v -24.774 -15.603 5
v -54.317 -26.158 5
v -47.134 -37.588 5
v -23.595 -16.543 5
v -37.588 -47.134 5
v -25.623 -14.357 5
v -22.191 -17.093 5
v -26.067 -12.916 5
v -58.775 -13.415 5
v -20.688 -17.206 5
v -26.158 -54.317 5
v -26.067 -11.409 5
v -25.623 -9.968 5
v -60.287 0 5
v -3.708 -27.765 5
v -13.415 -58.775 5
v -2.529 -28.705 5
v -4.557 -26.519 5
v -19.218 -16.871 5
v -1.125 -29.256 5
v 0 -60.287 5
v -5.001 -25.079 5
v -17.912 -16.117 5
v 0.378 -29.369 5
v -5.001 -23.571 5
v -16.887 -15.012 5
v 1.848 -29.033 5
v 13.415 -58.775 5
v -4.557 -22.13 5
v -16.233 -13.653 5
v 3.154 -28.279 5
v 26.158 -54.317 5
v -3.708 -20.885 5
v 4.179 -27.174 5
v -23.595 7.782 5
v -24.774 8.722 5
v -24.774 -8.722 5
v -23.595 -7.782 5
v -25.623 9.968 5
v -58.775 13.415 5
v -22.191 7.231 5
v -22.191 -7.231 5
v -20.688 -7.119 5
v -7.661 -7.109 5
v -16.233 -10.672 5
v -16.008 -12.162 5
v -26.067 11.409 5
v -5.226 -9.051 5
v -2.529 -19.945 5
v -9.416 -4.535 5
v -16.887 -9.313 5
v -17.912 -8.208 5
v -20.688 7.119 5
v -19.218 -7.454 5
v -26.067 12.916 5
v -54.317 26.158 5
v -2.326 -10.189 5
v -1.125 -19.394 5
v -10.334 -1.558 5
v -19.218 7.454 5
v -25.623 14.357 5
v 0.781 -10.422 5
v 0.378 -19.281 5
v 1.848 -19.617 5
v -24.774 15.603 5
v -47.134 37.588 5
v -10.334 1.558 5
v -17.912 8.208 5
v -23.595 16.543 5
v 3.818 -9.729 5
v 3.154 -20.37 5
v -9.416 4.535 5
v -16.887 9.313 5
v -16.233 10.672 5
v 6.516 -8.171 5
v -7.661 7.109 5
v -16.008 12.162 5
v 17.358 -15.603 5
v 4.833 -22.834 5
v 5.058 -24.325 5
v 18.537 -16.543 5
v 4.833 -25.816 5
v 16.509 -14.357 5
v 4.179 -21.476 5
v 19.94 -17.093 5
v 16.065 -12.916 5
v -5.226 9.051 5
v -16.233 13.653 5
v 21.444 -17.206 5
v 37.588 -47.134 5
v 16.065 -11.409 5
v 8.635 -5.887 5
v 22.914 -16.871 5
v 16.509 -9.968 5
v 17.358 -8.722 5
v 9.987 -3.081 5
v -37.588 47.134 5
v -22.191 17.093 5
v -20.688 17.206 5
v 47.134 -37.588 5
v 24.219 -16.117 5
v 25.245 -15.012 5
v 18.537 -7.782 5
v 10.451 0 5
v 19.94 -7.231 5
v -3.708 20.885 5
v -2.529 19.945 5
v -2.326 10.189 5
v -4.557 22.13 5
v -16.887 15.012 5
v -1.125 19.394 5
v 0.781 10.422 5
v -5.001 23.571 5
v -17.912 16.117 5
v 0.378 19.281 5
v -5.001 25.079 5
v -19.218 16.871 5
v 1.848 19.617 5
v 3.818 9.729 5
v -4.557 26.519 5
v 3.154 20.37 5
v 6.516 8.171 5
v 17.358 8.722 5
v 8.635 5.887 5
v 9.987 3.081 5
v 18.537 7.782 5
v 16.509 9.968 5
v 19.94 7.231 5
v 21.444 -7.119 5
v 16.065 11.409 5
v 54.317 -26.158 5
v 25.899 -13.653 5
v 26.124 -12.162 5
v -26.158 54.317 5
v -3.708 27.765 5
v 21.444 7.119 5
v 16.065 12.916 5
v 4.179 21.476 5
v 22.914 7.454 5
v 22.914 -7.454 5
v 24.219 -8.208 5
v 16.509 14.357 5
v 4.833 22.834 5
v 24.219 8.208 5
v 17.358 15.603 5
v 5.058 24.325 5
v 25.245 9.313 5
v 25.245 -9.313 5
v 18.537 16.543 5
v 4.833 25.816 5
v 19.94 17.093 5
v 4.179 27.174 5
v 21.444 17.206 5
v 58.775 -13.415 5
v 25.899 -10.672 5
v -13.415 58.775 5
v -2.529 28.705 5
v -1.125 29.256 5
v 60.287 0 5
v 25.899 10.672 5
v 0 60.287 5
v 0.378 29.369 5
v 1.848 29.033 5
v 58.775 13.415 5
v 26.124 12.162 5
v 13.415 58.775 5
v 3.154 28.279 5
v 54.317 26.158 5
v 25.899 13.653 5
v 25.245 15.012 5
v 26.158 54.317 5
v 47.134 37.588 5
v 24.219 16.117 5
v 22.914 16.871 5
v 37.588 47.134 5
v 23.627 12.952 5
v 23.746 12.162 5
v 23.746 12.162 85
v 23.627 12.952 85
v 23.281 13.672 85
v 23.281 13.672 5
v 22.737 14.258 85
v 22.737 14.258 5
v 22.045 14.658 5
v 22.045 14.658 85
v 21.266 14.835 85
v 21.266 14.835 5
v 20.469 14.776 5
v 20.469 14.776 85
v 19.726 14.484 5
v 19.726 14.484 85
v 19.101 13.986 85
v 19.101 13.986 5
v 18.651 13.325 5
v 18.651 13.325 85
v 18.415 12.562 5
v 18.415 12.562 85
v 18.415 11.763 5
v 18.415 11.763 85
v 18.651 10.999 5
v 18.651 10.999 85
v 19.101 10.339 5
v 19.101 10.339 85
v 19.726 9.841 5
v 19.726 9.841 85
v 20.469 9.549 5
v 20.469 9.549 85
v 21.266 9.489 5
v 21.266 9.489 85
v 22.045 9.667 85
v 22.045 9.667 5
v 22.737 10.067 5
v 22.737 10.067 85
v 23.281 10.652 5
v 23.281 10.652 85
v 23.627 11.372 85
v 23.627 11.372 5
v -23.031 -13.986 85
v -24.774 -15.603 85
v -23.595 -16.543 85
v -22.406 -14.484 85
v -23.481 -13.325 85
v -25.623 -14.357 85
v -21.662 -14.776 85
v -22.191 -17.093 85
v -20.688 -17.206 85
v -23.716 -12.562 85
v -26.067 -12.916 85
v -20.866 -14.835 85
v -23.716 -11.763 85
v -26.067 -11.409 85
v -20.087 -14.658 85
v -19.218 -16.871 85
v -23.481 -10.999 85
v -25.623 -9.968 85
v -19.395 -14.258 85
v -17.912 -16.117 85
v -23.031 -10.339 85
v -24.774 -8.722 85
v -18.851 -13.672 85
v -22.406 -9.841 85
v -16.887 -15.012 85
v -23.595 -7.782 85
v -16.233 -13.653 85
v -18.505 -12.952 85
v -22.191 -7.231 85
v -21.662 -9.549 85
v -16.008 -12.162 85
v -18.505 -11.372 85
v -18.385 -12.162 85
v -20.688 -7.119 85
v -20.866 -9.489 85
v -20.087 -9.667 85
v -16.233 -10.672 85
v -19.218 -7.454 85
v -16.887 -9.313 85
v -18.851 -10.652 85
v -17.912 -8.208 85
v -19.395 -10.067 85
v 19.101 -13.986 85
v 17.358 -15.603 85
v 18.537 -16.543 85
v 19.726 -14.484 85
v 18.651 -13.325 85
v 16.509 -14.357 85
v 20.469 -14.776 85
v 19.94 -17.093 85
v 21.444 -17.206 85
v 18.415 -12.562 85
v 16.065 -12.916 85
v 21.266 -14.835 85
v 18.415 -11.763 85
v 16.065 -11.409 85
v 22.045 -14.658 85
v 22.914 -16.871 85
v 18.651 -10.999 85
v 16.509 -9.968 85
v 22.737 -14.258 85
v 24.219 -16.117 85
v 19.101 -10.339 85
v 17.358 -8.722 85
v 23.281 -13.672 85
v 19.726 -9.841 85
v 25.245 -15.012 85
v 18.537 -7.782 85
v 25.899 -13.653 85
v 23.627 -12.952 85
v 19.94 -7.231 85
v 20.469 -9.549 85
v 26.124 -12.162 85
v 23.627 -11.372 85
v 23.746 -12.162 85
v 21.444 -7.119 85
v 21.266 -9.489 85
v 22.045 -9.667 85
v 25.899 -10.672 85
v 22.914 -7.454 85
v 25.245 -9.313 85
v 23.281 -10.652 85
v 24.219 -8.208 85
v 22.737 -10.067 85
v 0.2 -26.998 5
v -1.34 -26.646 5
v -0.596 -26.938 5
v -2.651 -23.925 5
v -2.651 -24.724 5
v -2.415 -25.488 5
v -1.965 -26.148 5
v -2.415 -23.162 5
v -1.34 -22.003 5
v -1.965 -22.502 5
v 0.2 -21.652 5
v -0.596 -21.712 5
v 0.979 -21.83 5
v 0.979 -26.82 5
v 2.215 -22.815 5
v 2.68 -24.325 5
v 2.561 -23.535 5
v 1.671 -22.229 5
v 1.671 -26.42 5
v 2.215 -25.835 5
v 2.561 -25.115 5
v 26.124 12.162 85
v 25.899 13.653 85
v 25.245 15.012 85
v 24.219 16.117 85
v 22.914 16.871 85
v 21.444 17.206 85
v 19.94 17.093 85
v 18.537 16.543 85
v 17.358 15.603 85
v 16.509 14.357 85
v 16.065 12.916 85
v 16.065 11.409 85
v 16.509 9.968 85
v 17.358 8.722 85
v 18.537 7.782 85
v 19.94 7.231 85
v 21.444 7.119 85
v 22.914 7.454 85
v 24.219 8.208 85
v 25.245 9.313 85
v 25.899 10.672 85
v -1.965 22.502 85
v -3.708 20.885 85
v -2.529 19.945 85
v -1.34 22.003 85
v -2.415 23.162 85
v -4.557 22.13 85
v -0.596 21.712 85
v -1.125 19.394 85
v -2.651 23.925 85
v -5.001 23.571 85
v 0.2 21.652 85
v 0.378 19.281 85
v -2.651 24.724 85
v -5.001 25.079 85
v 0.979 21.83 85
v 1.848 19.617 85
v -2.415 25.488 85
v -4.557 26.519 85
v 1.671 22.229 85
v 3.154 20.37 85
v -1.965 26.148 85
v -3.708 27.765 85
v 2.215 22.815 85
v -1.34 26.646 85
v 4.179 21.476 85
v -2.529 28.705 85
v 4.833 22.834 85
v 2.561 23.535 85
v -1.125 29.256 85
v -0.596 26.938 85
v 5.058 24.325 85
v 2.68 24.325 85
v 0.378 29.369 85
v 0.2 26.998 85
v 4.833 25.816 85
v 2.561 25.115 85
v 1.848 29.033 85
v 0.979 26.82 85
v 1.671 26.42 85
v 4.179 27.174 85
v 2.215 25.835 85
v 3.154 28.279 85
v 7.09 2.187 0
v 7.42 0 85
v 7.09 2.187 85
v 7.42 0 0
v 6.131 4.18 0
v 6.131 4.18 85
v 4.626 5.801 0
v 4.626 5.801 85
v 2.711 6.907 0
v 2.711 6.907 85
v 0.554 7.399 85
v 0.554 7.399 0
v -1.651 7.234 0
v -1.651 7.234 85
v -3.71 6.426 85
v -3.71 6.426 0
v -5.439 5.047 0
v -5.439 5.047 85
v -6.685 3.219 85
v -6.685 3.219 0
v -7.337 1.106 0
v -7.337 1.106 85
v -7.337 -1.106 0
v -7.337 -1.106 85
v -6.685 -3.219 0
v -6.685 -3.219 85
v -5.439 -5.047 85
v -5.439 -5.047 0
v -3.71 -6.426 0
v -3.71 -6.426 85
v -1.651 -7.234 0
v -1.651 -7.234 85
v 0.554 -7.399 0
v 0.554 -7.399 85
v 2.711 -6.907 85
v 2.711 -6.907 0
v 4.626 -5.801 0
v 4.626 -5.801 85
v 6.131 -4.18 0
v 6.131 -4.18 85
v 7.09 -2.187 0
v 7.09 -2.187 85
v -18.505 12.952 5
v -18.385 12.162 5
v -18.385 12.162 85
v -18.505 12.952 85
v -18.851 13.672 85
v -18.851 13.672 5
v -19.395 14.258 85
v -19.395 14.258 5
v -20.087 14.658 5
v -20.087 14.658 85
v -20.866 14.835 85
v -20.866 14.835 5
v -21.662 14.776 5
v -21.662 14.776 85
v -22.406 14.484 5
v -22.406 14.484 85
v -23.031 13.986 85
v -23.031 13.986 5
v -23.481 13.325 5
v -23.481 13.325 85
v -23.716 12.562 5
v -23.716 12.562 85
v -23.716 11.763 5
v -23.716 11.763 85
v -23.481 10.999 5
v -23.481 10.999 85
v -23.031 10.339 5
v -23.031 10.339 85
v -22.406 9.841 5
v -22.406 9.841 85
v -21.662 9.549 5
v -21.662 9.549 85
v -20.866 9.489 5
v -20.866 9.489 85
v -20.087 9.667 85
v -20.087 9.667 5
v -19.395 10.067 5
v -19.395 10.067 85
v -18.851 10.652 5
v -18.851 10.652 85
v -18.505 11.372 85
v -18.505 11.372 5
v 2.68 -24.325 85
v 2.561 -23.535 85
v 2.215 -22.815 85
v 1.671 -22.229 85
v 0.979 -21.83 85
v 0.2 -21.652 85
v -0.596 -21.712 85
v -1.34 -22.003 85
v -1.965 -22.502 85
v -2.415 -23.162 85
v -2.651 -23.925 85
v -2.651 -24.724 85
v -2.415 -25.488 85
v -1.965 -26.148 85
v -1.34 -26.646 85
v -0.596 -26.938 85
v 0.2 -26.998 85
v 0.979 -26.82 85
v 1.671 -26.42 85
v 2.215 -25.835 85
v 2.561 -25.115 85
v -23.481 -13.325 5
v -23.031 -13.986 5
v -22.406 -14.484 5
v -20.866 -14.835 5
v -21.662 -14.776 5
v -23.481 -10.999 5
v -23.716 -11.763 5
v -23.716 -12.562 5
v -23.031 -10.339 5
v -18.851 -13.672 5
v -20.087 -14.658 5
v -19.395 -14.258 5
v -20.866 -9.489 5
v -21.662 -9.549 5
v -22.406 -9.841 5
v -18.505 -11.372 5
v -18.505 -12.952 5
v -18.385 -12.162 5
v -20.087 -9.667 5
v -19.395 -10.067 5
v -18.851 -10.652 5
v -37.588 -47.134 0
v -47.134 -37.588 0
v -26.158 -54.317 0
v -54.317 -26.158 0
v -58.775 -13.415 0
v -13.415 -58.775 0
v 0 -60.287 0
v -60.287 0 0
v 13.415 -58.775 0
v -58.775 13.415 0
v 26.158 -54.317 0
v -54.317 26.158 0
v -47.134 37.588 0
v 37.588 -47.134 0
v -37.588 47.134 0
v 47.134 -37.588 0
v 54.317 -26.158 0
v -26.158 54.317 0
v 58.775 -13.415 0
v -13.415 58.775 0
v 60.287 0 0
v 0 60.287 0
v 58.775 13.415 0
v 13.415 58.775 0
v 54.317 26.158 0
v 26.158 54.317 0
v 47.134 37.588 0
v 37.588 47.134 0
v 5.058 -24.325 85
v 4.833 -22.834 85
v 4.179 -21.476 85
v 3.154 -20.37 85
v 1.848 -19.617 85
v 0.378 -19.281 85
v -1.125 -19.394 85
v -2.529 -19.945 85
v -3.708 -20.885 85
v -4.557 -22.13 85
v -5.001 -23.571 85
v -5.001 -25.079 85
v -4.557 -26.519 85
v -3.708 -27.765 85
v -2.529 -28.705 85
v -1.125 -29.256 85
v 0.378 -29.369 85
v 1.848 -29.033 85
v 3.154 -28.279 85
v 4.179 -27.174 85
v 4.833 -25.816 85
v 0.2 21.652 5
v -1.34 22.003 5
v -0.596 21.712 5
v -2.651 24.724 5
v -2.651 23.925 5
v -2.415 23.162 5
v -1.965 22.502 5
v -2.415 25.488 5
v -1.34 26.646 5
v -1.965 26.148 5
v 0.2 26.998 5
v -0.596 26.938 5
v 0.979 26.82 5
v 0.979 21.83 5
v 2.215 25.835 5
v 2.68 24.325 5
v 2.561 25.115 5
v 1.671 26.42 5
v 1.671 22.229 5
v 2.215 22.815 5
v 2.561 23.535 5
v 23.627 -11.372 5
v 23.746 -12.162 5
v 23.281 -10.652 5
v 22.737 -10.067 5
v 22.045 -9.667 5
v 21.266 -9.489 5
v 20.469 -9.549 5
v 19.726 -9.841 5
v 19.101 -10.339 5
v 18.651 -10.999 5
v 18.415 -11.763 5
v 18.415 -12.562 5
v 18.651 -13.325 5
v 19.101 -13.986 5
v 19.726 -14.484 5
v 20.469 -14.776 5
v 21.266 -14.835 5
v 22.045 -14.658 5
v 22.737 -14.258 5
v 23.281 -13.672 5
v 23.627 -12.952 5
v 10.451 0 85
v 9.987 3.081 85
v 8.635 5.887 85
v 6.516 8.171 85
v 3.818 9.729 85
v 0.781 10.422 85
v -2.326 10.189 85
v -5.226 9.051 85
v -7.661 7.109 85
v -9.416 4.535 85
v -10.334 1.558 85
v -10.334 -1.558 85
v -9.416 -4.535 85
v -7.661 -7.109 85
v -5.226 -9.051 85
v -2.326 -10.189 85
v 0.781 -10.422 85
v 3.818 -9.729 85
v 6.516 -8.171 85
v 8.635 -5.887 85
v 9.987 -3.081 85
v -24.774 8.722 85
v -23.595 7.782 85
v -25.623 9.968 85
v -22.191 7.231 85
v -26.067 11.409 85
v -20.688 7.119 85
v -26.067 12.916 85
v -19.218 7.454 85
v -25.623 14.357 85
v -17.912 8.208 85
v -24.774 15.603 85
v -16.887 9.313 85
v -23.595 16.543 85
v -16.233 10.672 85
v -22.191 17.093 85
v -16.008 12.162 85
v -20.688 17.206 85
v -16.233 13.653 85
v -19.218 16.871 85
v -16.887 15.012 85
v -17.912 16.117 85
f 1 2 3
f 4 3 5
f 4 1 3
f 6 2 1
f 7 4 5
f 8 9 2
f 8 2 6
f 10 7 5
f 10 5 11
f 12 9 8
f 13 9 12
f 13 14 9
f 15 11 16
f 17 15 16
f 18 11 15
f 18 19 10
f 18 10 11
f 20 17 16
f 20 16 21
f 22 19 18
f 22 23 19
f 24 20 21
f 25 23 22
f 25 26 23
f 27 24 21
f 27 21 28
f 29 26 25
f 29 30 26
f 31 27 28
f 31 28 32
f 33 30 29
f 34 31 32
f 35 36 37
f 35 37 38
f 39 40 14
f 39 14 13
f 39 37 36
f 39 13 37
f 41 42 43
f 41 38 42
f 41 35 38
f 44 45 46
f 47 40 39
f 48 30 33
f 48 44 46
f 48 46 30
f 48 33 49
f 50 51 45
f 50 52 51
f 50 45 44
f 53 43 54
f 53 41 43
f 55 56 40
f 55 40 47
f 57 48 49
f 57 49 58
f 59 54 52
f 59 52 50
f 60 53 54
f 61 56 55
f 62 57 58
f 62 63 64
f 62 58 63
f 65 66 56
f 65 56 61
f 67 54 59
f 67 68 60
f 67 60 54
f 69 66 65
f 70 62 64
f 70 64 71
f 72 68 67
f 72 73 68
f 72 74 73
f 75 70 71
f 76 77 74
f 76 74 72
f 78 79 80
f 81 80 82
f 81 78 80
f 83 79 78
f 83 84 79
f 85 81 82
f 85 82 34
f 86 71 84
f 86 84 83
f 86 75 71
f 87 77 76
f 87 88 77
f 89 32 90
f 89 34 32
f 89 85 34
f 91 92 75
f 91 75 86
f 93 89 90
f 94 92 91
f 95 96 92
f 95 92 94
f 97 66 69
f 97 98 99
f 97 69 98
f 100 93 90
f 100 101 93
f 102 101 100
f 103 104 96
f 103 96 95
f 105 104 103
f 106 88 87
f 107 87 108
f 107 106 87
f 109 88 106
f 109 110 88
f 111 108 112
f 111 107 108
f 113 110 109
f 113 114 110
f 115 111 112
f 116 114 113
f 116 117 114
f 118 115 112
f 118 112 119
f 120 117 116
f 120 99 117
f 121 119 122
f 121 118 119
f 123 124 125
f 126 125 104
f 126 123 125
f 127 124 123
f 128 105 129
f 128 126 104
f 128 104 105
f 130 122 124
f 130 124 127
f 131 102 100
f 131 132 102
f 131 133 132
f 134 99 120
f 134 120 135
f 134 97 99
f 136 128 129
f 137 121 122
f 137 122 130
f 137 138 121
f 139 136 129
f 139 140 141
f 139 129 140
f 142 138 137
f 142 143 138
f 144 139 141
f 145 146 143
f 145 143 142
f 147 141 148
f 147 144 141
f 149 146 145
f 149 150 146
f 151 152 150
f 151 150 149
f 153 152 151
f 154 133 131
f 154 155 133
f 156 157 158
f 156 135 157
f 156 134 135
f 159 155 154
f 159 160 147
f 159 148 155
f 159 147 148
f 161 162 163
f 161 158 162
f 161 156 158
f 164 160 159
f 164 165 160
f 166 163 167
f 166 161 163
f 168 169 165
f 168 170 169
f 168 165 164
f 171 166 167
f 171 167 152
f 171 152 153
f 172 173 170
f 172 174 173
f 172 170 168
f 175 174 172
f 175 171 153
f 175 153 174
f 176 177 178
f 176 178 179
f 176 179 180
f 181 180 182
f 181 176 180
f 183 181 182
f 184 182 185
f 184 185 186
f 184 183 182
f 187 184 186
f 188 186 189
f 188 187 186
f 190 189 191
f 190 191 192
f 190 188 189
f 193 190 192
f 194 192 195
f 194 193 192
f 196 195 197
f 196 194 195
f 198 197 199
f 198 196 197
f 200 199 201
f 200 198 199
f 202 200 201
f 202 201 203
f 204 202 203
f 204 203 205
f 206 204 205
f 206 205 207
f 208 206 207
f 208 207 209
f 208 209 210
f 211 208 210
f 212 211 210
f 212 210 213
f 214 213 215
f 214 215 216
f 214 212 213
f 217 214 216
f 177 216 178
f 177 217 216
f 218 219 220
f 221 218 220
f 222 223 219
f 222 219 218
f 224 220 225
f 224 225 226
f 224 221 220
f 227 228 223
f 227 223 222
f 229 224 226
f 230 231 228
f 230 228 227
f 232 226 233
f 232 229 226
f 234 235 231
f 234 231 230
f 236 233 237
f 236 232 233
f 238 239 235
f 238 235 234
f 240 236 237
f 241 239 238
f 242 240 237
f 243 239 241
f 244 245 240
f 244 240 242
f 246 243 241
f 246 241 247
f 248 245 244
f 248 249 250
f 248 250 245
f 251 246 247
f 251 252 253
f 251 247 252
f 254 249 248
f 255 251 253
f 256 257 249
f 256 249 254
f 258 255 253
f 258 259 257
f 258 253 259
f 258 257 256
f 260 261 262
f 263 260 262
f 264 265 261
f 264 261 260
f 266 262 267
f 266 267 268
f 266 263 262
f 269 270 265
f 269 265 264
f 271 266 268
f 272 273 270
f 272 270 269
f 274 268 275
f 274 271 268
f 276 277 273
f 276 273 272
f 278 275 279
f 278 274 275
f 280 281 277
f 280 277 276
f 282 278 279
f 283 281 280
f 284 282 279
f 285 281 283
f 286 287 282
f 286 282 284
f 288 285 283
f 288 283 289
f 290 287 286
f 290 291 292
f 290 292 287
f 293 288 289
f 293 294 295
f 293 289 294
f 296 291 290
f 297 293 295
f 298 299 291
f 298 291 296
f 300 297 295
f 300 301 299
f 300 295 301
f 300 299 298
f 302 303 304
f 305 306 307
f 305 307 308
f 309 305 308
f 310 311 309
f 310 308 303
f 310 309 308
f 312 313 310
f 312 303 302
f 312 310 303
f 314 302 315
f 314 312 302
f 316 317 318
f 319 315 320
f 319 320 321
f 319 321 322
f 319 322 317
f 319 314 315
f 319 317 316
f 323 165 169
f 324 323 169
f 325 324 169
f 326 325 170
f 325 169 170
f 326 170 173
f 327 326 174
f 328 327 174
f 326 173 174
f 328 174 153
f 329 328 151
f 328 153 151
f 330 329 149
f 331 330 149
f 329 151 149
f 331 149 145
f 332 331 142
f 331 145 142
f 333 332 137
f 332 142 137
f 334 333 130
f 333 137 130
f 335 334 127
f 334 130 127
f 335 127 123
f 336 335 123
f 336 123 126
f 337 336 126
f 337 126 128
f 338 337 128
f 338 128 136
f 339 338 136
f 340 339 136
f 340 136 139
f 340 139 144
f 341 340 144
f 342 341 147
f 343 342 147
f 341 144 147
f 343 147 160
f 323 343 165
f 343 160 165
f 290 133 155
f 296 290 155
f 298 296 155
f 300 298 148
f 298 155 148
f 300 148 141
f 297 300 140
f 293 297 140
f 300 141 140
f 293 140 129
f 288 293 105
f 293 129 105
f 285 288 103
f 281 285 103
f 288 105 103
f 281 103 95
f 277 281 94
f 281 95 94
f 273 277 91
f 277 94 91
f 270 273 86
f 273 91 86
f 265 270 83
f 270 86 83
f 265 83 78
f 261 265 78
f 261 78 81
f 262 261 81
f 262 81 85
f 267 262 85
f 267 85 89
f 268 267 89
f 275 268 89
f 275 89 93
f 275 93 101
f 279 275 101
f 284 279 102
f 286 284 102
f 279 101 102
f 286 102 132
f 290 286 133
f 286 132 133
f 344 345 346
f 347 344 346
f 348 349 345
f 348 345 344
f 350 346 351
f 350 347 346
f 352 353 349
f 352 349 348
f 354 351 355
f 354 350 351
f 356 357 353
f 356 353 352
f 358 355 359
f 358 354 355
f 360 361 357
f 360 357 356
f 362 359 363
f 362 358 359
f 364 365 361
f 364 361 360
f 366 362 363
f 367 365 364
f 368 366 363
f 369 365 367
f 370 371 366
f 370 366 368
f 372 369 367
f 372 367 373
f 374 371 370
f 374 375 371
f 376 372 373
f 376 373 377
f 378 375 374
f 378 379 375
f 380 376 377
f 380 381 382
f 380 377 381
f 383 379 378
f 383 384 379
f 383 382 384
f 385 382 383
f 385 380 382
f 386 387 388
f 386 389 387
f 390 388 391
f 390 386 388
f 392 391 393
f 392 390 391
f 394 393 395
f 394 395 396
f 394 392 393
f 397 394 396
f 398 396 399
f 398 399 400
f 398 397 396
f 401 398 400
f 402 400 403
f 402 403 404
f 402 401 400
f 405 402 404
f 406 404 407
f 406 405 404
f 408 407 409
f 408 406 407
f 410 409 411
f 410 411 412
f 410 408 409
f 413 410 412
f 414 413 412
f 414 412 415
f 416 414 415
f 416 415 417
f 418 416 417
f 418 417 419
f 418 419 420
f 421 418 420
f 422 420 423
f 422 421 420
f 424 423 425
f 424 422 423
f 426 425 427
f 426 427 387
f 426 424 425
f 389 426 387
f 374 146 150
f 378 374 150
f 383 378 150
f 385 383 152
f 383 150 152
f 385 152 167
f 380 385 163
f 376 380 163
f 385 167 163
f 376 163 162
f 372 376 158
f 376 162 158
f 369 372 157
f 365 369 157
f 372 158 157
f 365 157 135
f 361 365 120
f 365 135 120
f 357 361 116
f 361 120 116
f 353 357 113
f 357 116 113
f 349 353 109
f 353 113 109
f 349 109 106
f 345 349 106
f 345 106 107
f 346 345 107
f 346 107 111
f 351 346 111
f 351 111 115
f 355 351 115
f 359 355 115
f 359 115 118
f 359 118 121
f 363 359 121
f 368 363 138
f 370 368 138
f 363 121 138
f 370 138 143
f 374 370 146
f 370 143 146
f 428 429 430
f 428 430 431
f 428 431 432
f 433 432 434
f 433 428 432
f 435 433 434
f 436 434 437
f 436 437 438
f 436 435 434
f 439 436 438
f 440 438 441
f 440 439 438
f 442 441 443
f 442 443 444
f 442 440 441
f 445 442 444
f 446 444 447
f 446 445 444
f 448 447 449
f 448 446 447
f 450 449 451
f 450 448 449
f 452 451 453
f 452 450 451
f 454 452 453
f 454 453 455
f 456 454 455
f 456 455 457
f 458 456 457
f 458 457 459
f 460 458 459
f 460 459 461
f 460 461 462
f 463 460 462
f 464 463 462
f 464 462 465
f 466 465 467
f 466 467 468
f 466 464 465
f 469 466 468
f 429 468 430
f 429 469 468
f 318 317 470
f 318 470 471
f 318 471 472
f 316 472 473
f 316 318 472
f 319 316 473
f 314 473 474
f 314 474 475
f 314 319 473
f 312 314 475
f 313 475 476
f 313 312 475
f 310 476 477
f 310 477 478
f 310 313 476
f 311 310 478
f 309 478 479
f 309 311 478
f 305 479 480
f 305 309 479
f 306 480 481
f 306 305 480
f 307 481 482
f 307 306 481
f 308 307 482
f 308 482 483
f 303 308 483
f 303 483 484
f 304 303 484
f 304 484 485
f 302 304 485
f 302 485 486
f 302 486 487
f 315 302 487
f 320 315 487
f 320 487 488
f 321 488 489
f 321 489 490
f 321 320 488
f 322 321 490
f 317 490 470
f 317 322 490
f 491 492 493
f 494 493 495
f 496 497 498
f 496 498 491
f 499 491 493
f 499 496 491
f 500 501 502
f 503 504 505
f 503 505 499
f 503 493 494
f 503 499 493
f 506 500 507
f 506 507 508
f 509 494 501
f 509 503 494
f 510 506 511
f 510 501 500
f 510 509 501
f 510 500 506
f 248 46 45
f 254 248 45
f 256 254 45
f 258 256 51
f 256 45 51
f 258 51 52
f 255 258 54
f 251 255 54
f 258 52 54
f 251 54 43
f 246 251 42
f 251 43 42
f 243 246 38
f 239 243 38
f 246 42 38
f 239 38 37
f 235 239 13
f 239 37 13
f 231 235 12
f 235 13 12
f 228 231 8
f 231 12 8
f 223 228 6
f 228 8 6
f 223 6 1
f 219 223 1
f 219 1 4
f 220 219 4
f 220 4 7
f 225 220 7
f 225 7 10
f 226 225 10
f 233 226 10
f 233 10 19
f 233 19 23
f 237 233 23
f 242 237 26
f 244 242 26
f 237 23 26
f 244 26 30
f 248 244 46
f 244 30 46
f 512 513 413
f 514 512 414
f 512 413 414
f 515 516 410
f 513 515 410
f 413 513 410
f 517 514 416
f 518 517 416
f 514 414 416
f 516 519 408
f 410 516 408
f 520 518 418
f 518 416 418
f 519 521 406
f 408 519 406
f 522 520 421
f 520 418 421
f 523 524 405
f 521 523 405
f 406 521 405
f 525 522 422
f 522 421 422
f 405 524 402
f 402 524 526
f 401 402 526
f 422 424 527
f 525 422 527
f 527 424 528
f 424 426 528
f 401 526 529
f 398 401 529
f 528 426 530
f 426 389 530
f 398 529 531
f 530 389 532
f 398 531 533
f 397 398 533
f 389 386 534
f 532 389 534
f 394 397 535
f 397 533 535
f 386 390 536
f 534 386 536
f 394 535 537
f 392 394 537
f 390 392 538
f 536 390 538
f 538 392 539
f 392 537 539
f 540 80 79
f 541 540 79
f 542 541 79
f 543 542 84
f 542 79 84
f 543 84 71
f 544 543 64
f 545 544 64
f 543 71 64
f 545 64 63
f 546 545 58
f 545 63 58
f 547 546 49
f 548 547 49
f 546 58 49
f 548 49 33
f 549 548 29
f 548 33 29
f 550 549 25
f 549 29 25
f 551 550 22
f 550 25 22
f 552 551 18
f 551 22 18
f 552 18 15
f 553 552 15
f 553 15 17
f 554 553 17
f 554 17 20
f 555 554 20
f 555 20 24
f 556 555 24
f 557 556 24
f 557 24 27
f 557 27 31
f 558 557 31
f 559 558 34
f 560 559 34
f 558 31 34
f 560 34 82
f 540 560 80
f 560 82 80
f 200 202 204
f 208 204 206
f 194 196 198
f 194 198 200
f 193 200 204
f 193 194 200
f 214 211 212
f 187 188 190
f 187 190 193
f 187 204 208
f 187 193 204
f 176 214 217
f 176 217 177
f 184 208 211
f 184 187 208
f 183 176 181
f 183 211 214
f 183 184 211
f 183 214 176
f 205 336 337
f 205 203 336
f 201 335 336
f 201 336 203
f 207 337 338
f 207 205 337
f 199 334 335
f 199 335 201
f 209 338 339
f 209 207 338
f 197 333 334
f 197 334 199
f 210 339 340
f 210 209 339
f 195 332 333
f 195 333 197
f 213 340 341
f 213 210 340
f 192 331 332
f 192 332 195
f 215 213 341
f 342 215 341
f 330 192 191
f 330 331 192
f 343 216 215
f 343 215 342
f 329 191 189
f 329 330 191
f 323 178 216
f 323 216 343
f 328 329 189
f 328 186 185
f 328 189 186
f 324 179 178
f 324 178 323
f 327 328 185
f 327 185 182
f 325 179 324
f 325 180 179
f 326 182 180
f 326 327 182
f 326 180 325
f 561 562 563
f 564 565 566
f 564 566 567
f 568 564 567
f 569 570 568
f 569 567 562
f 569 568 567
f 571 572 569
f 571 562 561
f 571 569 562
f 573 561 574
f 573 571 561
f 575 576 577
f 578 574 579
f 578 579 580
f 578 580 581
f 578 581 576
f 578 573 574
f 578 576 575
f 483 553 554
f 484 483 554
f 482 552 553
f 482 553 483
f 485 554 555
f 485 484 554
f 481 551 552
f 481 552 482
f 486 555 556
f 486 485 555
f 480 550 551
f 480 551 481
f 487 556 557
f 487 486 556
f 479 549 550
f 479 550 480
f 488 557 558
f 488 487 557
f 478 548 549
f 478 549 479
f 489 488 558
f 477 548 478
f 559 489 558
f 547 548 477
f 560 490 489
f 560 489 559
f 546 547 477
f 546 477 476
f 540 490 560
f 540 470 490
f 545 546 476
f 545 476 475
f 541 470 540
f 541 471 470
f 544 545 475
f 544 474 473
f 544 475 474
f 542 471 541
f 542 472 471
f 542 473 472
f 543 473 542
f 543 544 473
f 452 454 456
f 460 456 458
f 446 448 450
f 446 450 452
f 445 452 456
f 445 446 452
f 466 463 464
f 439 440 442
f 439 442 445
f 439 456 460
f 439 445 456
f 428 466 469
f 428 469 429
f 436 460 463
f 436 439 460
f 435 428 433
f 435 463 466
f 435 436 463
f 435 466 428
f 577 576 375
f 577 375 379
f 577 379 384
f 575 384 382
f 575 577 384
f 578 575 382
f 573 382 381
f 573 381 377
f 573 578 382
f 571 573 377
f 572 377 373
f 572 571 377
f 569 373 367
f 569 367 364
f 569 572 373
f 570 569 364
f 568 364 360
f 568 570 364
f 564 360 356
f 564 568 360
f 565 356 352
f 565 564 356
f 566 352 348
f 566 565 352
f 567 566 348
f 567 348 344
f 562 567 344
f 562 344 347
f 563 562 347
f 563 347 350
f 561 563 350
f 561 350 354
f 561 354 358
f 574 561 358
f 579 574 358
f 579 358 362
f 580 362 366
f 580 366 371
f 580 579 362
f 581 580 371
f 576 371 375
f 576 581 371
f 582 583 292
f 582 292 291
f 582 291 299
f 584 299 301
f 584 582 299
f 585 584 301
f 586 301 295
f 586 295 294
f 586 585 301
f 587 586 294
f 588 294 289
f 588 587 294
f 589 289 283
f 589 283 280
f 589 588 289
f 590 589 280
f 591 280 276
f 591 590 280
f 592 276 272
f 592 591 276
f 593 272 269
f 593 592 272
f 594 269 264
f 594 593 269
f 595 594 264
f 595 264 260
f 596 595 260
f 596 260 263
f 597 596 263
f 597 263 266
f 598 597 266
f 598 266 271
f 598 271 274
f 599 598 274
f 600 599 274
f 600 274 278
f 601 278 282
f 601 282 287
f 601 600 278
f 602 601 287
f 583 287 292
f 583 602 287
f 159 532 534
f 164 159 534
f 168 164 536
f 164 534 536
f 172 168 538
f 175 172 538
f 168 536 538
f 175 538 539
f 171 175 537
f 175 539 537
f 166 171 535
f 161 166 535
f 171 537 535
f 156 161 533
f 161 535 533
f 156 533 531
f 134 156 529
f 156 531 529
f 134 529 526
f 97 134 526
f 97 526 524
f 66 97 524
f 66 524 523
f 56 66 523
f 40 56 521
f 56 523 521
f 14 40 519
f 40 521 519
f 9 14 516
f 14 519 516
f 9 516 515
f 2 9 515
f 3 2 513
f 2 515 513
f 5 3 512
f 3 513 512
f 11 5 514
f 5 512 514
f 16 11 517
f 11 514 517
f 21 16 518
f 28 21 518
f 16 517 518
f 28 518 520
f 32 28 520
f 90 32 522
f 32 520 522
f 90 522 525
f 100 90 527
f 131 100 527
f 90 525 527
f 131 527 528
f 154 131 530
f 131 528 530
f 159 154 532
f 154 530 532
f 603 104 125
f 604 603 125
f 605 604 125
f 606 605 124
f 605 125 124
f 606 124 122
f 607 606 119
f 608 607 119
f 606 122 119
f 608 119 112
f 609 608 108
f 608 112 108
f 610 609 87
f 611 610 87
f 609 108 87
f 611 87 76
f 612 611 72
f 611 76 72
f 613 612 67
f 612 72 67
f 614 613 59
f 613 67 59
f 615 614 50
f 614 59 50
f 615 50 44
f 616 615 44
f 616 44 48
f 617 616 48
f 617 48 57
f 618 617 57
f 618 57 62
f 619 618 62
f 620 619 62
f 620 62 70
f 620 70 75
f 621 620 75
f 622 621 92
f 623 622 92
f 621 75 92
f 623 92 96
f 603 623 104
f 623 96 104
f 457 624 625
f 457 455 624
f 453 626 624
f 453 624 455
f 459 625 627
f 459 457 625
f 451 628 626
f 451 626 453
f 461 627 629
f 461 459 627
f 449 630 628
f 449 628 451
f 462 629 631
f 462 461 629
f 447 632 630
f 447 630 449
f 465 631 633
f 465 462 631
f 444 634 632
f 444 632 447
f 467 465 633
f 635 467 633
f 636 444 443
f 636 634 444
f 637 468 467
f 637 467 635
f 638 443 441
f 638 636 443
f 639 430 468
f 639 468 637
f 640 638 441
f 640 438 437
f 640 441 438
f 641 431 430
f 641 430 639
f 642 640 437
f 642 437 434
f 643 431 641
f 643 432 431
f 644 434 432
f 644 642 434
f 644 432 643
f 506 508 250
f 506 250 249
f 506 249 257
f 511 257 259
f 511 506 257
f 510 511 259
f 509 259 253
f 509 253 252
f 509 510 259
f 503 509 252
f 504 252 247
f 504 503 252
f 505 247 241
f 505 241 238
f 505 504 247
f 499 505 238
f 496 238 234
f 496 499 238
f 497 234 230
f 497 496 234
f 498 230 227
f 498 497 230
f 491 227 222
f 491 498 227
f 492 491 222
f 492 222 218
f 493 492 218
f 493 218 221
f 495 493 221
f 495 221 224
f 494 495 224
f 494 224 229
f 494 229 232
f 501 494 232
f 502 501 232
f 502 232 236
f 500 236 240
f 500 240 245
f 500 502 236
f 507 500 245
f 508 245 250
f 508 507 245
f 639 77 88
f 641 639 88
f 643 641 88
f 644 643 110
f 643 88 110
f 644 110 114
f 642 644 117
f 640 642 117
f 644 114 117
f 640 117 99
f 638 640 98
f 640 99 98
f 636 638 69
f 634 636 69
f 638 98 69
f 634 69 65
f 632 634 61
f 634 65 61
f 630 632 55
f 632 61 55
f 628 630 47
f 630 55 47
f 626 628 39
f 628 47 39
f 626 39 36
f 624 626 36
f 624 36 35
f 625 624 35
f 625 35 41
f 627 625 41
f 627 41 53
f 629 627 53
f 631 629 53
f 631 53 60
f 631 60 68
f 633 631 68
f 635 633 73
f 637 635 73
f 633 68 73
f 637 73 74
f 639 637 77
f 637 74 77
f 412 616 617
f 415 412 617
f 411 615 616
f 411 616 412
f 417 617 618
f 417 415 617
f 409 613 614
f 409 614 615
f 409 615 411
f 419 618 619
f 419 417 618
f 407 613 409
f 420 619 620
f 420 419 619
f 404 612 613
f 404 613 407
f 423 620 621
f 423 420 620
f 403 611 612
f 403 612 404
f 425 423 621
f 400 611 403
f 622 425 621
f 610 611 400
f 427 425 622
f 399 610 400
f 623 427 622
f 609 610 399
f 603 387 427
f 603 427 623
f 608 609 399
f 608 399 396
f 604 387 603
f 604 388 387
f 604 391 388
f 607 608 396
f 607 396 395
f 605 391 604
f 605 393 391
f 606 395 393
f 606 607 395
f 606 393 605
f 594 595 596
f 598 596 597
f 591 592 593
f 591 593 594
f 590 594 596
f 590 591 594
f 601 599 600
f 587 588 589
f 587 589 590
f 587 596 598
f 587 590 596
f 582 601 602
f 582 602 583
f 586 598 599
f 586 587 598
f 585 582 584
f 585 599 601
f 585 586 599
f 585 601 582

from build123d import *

# Parameters (mm, degrees)
F0_R     = 60.286911
F0_R_2   = 7.419819
F1_DEPTH = 5
F2_R     = 10.451192
F2_R_2   = 7.419819
F2_R_3   = 5.05785
F2_R_4   = 2.680452
F3_DEPTH = 80


with BuildPart() as f1:
    # F0 (on Top) → F1 (new body)
    with BuildSketch(Plane.XY):
        Circle(F0_R)
        Circle(F0_R_2, mode=Mode.SUBTRACT)
    extrude(amount=F1_DEPTH)

    # F2 (on face) → F3 (join)
    with BuildSketch(Plane.XY.offset(5)):
        Circle(F2_R)
        Circle(F2_R_2, mode=Mode.SUBTRACT)
        with Locations((0, -24.324838)):
            Circle(F2_R_3)
        with Locations((0, -24.324838)):
            Circle(F2_R_4, mode=Mode.SUBTRACT)
        with Locations((-21.065928, -12.162419)):
            Circle(F2_R_3)
        with Locations((-21.065928, -12.162419)):
            Circle(F2_R_4, mode=Mode.SUBTRACT)
        with Locations((0, 24.324838)):
            Circle(F2_R_3)
        with Locations((0, 24.324838)):
            Circle(F2_R_4, mode=Mode.SUBTRACT)
        with Locations((-21.065928, 12.162419)):
            Circle(F2_R_3)
        with Locations((-21.065928, 12.162419)):
            Circle(F2_R_4, mode=Mode.SUBTRACT)
        with Locations((21.065928, 12.162419)):
            Circle(F2_R_3)
        with Locations((21.065928, 12.162419)):
            Circle(F2_R_4, mode=Mode.SUBTRACT)
        with Locations((21.065928, -12.162419)):
            Circle(F2_R_3)
        with Locations((21.065928, -12.162419)):
            Circle(F2_R_4, mode=Mode.SUBTRACT)
    extrude(amount=F3_DEPTH)


solid = f1.part
